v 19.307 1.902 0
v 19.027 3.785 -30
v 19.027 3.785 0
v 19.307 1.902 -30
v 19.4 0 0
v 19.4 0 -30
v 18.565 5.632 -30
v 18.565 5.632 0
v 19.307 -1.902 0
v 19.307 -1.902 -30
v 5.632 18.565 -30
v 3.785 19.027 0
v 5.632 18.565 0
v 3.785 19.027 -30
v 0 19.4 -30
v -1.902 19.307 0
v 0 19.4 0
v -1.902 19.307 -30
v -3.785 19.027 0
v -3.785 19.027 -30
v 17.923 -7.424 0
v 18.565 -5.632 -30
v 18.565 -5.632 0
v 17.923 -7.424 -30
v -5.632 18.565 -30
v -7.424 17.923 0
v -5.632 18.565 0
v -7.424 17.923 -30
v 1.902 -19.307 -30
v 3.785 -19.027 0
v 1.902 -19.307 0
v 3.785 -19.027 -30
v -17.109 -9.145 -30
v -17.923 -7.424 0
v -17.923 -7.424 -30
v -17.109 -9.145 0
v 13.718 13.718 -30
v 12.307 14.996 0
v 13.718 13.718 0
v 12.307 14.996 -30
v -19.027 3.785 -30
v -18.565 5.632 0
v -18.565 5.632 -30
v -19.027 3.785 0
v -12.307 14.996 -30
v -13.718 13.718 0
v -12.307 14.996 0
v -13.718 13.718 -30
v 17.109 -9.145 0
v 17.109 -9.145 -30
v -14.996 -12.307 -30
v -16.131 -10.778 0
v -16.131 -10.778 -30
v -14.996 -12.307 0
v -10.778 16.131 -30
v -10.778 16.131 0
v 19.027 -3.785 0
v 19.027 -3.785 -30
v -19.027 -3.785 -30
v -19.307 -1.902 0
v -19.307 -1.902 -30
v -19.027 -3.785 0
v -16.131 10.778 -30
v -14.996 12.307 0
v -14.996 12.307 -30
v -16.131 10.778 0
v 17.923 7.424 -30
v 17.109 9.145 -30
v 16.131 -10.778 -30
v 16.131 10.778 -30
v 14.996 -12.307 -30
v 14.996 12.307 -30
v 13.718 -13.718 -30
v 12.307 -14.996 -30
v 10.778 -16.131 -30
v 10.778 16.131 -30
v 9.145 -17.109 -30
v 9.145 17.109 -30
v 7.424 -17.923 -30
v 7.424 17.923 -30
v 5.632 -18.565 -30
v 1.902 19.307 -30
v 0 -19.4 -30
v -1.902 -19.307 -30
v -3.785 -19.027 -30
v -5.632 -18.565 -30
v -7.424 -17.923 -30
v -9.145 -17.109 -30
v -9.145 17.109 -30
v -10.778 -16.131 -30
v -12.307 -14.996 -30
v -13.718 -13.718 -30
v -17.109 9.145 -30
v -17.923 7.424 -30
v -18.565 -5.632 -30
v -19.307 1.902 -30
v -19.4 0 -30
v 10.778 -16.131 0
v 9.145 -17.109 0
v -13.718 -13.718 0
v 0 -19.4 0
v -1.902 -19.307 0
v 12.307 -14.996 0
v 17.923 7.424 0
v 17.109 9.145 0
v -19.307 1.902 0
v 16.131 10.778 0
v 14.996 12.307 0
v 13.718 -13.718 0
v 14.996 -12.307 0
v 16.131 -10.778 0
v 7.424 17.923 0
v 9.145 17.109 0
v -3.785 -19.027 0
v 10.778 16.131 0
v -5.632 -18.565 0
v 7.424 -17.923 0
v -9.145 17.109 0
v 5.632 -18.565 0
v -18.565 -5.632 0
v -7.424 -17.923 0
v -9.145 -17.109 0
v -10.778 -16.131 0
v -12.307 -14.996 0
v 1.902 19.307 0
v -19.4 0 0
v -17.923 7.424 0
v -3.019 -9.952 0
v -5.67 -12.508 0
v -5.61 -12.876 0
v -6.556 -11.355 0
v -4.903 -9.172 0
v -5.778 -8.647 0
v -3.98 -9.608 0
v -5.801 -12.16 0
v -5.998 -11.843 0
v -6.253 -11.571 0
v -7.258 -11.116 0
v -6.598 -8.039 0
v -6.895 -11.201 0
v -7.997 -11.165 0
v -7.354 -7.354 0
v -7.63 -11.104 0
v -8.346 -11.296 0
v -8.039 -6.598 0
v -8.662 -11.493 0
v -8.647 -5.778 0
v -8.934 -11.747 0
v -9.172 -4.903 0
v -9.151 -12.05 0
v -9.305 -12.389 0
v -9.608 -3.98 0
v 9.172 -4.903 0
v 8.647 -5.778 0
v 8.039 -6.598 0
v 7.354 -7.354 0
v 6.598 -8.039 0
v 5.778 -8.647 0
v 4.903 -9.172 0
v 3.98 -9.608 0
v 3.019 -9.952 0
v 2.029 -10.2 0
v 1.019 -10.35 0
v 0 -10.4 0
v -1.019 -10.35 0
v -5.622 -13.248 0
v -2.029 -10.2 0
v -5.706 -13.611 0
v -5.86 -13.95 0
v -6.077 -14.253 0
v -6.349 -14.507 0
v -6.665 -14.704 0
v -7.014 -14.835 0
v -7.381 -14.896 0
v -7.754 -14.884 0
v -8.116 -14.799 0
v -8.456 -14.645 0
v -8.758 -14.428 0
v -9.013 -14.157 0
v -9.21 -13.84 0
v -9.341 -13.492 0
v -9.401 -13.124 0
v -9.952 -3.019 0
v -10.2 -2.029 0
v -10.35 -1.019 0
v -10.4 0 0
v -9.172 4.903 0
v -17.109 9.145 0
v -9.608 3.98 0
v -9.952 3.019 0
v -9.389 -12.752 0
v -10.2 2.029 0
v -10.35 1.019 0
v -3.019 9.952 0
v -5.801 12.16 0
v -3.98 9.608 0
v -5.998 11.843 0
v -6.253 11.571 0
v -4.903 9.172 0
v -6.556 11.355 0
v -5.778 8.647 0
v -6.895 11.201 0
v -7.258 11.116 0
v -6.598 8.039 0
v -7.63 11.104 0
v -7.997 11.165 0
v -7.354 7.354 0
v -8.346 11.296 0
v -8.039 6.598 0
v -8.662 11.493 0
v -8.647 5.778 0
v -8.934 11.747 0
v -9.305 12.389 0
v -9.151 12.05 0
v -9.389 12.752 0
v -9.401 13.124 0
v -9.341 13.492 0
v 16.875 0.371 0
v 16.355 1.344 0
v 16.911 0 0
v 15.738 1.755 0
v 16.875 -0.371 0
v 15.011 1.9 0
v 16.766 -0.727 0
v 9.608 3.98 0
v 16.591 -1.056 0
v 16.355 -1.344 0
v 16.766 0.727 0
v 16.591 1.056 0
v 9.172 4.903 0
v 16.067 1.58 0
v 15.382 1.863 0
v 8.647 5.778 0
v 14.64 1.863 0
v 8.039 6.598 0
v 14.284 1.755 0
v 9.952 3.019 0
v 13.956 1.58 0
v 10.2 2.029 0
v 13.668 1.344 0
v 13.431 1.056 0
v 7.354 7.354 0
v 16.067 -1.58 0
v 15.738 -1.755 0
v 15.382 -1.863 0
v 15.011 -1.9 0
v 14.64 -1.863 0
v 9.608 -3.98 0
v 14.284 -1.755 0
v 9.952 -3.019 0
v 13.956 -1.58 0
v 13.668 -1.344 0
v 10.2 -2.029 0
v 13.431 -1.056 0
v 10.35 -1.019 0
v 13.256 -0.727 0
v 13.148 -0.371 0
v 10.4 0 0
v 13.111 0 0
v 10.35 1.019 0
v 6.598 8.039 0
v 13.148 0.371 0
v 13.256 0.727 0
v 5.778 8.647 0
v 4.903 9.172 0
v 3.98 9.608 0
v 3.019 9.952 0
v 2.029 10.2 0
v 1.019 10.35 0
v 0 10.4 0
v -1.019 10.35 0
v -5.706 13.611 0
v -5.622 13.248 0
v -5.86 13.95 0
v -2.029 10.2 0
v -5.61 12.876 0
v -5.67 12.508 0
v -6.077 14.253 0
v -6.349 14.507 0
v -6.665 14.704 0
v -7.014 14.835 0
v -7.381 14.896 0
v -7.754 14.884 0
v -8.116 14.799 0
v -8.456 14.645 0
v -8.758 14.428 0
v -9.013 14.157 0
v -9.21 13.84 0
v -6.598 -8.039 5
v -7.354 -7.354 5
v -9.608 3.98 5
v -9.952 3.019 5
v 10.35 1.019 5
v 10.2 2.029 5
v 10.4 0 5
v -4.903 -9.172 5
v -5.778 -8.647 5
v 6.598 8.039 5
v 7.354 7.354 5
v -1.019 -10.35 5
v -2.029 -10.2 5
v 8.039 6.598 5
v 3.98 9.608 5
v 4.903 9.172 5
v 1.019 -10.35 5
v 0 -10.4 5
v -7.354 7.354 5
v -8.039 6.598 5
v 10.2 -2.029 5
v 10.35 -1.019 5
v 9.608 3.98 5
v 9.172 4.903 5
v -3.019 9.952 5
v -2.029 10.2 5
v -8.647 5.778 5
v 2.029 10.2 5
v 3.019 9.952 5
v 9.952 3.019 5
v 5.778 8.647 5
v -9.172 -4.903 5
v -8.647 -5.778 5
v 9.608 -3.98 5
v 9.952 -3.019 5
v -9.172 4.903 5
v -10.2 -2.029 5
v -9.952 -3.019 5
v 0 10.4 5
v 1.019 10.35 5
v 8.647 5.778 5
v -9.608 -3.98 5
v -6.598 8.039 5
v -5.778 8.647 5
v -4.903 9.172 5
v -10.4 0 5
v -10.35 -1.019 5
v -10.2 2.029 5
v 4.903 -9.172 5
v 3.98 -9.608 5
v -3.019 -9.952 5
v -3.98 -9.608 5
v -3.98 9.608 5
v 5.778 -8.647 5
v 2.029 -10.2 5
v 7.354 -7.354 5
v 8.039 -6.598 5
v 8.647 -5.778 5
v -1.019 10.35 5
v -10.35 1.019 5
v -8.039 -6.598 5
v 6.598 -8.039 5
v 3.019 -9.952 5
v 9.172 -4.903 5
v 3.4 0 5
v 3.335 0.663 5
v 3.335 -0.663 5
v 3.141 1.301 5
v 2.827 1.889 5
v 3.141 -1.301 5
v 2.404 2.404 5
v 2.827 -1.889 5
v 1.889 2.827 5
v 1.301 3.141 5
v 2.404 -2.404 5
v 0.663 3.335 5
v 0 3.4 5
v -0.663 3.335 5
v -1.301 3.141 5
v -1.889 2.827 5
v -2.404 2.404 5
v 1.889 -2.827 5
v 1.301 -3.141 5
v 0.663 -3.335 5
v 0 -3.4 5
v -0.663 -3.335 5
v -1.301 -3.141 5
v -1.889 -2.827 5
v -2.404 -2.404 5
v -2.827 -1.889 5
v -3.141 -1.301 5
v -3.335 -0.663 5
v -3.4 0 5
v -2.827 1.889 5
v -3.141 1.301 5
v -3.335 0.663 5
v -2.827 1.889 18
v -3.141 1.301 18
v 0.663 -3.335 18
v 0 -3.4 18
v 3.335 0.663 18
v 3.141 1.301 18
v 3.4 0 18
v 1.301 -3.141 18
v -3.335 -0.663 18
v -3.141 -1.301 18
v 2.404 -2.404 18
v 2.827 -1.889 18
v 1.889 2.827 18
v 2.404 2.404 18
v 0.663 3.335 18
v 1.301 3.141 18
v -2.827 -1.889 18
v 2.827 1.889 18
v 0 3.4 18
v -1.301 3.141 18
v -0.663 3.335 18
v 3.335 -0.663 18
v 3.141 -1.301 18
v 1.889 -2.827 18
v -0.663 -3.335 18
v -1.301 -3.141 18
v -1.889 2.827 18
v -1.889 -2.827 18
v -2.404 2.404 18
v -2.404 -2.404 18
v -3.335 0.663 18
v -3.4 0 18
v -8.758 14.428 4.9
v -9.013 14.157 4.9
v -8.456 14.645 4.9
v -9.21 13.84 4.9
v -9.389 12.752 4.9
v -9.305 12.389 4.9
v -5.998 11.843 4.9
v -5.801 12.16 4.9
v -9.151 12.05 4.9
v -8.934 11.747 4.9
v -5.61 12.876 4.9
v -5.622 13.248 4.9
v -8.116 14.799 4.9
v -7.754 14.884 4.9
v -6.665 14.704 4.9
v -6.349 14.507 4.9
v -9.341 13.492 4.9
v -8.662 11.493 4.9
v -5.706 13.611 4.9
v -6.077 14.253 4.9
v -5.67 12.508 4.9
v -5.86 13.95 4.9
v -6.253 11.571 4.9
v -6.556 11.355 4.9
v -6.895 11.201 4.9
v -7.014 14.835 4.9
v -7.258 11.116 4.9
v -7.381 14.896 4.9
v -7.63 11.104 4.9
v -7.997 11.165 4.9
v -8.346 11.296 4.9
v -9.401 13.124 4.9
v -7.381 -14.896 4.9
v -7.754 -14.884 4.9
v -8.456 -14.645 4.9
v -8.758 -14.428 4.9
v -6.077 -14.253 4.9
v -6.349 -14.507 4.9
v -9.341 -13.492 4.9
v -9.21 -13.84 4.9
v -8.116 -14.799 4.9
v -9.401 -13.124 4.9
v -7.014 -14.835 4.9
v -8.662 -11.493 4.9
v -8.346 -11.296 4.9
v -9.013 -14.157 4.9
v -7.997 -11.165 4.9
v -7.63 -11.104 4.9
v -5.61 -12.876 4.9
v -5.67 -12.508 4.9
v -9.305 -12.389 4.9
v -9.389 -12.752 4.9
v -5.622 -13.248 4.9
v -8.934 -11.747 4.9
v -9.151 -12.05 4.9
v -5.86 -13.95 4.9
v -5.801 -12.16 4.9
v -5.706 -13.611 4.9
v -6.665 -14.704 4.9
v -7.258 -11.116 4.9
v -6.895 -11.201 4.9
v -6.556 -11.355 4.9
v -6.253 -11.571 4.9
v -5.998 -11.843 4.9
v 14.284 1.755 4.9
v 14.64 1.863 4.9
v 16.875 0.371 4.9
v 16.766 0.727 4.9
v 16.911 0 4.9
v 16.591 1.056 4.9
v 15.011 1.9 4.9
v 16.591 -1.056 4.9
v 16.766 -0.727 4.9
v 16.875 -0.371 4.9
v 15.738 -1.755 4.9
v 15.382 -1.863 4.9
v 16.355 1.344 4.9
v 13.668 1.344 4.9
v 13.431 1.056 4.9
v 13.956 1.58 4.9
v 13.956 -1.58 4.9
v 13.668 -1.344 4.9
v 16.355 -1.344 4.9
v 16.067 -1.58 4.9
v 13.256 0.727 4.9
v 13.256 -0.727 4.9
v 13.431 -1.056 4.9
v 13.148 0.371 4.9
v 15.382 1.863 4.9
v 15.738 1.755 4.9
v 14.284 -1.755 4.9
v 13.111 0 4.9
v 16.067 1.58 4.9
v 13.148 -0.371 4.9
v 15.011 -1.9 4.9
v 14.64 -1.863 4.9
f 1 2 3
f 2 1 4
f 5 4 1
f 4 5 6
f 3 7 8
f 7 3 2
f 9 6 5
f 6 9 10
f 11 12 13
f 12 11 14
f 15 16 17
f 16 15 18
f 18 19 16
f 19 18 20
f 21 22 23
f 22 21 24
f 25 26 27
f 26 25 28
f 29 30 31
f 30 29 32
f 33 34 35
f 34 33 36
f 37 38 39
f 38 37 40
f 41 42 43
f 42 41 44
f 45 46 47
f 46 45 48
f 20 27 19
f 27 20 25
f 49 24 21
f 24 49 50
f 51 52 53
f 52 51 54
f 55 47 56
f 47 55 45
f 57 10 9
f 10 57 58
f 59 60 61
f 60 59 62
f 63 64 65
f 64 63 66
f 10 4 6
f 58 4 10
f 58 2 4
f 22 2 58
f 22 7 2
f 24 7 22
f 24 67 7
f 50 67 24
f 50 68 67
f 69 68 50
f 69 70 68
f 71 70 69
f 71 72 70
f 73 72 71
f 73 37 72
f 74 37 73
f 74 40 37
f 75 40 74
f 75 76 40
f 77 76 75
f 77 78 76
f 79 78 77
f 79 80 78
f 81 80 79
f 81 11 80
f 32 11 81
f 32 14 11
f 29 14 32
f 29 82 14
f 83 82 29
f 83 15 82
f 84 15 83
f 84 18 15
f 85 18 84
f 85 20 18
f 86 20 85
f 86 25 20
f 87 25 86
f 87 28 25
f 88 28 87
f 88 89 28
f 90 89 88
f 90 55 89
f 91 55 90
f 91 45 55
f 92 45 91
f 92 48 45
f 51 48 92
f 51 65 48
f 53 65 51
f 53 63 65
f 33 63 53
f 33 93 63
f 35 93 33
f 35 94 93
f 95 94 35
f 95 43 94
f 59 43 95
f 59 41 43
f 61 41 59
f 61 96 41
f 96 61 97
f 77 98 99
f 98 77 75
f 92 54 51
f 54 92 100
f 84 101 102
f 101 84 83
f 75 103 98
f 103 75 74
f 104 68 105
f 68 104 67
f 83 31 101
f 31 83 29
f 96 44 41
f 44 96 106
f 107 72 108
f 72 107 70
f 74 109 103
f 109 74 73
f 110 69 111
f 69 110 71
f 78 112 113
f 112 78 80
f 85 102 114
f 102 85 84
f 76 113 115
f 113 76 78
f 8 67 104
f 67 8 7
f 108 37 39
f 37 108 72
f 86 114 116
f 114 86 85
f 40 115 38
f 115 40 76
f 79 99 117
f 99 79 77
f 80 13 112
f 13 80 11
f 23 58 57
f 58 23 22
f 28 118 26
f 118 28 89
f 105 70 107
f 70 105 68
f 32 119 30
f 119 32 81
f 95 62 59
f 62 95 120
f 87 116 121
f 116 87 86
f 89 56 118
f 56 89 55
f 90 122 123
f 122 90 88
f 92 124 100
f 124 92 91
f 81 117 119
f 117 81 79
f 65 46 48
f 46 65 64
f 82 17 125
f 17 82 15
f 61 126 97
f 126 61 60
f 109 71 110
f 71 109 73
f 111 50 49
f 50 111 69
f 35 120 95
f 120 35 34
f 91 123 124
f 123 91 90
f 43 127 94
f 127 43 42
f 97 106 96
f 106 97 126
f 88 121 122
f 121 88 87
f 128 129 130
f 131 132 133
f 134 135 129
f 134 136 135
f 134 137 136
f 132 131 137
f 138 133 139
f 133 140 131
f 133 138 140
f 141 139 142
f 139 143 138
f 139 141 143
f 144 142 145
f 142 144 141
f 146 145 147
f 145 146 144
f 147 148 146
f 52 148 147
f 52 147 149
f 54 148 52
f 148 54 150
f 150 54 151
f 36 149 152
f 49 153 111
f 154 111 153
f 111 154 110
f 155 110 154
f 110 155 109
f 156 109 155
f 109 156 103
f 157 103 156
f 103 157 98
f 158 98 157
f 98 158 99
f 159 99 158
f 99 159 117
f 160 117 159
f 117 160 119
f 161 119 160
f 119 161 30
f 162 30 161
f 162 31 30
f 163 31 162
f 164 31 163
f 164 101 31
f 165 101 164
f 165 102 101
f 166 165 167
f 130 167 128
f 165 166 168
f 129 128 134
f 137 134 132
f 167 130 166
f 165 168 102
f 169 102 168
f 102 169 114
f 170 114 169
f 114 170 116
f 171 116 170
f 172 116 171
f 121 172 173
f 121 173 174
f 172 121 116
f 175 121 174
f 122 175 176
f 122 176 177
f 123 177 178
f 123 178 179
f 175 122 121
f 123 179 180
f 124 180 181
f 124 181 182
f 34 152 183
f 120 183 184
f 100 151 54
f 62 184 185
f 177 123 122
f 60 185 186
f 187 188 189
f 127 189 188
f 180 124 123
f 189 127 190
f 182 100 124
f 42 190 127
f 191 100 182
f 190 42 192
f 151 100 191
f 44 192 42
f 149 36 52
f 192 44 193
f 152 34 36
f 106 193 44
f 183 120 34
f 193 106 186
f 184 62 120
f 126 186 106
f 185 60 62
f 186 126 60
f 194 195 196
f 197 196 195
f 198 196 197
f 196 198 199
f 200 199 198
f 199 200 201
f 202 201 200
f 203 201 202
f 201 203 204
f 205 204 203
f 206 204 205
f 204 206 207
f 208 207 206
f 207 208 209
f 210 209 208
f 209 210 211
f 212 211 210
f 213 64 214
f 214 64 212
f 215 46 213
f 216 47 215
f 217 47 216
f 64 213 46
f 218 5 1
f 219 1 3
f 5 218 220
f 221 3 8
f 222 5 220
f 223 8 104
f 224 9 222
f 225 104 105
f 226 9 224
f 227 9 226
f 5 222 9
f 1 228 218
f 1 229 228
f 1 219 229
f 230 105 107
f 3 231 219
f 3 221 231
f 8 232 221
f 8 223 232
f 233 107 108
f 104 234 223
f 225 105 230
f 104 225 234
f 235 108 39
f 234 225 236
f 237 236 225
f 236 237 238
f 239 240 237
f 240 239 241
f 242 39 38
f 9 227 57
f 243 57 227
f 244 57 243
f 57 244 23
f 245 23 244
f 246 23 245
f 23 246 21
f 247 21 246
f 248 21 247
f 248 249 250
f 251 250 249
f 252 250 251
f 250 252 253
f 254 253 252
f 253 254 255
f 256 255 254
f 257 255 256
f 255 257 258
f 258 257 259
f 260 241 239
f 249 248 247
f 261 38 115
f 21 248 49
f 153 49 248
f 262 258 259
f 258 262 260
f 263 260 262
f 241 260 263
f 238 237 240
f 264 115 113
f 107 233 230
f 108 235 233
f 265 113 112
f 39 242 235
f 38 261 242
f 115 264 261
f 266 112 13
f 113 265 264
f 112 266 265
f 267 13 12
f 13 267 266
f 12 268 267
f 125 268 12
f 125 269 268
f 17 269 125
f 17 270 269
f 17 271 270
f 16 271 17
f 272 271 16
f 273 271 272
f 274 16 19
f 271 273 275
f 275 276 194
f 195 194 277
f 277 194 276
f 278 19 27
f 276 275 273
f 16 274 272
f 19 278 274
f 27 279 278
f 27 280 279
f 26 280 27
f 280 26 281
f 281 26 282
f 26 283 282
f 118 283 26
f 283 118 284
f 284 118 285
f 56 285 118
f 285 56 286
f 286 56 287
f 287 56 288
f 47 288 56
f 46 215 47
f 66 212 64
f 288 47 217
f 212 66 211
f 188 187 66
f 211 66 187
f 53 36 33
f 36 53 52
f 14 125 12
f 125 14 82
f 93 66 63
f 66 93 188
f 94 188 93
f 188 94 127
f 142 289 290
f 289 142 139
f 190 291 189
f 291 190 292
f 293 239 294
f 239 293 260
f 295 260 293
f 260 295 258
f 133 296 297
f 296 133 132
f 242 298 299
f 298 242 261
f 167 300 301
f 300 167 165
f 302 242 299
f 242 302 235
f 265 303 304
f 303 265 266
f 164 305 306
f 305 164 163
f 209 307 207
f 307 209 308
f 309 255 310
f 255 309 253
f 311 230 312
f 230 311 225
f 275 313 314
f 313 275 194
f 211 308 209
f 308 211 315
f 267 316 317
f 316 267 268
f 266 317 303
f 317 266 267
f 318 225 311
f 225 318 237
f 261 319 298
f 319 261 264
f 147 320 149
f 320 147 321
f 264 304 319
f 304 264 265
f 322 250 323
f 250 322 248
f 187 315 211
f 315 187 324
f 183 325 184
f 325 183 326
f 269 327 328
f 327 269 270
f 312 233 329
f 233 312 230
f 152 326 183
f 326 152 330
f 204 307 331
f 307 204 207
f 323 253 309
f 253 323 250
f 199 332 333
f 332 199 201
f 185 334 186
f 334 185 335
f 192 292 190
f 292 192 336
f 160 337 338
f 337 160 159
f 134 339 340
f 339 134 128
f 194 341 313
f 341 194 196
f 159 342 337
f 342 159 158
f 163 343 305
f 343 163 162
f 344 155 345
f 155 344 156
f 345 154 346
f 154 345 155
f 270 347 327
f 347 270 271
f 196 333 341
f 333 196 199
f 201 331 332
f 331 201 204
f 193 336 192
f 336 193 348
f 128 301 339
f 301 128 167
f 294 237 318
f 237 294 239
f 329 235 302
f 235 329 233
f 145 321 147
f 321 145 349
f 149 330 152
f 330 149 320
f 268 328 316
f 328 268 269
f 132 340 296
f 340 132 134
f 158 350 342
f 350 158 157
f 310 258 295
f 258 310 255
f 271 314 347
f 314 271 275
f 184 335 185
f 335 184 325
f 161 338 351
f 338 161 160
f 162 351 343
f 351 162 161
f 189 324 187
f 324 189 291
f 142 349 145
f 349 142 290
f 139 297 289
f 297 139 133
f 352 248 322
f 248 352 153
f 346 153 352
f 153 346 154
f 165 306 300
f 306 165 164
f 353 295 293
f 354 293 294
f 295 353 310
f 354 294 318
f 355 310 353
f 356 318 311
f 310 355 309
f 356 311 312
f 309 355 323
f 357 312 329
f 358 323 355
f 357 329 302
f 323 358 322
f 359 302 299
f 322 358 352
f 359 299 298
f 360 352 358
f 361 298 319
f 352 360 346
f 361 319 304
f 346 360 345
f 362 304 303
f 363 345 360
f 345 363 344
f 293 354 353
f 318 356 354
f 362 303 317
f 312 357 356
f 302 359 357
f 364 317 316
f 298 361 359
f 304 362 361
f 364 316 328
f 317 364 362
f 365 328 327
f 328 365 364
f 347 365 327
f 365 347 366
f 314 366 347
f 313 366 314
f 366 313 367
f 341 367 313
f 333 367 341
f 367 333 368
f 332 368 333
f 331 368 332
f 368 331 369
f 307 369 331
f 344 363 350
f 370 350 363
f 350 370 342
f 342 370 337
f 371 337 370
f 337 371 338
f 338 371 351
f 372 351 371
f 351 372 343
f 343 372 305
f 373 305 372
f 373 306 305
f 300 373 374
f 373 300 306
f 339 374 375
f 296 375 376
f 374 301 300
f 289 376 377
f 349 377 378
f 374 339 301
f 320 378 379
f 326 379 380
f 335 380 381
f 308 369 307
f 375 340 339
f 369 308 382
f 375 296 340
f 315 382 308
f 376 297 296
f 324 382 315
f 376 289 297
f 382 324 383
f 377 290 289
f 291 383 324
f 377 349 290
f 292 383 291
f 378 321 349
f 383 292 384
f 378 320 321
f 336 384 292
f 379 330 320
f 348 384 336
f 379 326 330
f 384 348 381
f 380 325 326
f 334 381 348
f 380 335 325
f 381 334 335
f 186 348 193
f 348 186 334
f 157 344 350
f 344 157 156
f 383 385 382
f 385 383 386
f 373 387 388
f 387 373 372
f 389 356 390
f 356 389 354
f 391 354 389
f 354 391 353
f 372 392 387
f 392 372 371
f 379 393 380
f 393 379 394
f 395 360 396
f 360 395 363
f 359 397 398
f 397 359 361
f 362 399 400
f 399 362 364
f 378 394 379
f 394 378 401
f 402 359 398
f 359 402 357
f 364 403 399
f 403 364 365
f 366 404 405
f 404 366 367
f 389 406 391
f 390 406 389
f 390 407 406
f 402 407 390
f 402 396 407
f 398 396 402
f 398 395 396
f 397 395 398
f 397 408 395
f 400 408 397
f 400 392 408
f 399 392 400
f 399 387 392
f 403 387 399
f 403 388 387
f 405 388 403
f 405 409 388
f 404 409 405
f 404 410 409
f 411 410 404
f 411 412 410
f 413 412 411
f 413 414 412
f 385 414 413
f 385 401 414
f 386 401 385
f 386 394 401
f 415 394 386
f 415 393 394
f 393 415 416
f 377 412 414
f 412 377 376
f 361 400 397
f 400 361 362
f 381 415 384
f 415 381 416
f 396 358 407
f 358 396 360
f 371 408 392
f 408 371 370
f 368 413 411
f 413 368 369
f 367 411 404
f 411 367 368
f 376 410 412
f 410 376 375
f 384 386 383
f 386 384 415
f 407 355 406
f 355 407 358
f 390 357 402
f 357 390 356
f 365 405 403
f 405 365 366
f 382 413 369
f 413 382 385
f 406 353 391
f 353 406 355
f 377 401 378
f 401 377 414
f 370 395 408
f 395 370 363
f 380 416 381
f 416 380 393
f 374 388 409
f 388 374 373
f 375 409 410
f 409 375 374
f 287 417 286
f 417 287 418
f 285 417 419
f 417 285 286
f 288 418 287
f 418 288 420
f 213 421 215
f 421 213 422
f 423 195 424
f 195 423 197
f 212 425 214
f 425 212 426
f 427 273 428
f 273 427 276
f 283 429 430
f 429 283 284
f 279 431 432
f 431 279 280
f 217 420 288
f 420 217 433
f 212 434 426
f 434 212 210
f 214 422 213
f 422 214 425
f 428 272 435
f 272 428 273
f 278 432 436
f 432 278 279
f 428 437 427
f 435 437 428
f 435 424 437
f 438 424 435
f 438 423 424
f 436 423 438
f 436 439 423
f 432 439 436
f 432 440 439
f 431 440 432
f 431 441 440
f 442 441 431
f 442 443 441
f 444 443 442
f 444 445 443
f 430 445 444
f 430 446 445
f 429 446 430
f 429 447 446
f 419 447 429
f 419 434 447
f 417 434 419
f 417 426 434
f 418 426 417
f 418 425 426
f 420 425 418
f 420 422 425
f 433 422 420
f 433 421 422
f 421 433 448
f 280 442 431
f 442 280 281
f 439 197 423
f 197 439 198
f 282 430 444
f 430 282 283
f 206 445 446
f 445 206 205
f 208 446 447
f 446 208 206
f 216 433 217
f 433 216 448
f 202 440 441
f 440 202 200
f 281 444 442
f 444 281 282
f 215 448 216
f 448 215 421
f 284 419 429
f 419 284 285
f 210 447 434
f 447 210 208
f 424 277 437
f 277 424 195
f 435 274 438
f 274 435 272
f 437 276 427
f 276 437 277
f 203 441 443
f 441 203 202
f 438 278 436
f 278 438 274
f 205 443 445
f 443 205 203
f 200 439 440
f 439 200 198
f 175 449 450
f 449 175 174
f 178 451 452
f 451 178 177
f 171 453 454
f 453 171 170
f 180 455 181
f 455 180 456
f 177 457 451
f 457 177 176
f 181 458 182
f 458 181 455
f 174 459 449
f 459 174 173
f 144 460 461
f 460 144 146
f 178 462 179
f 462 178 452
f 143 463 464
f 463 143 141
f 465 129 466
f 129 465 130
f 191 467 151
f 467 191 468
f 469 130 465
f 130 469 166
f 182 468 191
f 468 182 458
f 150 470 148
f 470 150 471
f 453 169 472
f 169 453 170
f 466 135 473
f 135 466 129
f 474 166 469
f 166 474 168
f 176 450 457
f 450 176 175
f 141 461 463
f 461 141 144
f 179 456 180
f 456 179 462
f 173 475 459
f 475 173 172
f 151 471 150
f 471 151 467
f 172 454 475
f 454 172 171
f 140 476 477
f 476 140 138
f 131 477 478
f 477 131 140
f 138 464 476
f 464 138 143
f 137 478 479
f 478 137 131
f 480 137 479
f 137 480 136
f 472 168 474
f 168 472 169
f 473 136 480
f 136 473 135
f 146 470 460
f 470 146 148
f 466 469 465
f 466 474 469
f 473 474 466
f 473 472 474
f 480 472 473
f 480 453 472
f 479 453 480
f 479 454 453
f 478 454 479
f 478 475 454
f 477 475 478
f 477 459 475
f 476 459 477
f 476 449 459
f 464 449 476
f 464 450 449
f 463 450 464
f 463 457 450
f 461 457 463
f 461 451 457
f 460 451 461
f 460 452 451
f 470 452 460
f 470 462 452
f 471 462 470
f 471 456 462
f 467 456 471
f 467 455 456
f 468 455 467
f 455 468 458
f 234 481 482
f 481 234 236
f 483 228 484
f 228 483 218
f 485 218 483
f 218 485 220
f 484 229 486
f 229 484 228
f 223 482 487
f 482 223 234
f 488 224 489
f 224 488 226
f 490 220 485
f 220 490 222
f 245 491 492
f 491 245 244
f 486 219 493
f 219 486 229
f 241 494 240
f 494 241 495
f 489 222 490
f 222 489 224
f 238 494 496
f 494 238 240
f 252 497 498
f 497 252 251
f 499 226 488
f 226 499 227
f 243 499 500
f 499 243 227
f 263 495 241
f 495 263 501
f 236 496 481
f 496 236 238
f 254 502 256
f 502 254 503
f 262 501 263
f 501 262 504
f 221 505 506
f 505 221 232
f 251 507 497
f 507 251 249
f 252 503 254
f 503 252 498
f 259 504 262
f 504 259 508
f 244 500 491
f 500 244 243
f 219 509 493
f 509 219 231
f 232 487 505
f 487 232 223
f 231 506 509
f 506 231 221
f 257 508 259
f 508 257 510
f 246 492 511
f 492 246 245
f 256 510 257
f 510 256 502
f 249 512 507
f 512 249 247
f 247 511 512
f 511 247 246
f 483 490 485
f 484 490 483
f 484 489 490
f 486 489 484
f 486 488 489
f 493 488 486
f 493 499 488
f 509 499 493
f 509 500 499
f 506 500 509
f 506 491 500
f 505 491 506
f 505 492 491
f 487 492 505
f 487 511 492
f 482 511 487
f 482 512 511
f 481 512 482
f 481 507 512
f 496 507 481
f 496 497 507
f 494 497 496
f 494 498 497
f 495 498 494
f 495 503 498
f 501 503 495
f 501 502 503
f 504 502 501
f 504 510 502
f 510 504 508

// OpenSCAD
_ScrewLength = 5;
_ScrewDiameter = 3.8;
_AluWidth = 25;
_WheelDiameter = 96;
_BoltDiameter = 6.8;
_Tolerance = 0.2;

//EncoderMount2();
//Concept();
//BallBearingMount();
Encoder();
module Encoder()
{
	translate([0,0,-30])
	union()
	{
		cylinder(d=38.8, h=30, $fn=64);
		translate([0,0,29.9])
		cylinder(d=20.8, h=5.1, $fn=64);
		translate([0,0,34.9])
		cylinder(d=6.8, h=13.1, $fn=32);

		rotate([0,0,120])
		translate([15.0111,0,29.9])
		cylinder(d=_ScrewDiameter, h=_ScrewLength, $fn=32);
		rotate([0,0,240])
		translate([15.0111,0,29.9])
		cylinder(d=_ScrewDiameter, h=_ScrewLength, $fn=32);
		translate([15.0111,0,29.9])
		cylinder(d=_ScrewDiameter, h=_ScrewLength, $fn=32);
	}
}

module Wheel()
{
	cylinder(d=_WheelDiameter, h=15, $fn=64);
}

module Concept()
{
	rotate([90,0,-90])
	union()
	{
		EncoderMount();
		translate([0,0,3])
		rotate([180,0,0])
		Encoder();
		translate([0,0,-18])
		Wheel();
	}
}

module BallBearingMount()
{
	translate([0,0,4.5])
	difference()
	{
		union()
		{
			cube([3*_AluWidth, _AluWidth, 9], center=true);
			cylinder(d=30, h=9, $fn=64, center=true);
		}
		union()
		{
			translate([0,0,1+0.5*_Tolerance])
			cylinder(d=22.4, h=7+_Tolerance, $fn=64, center=true);
			cylinder(d=13, h=0.5*_AluWidth-_Tolerance+0.2, $fn=64, center=true);
			translate([_AluWidth,0,0])
			cylinder(d=_BoltDiameter, h=0.5*_AluWidth-_Tolerance+0.2, $fn=64, center=true);
			translate([-_AluWidth,0,0])
			cylinder(d=_BoltDiameter, h=0.5*_AluWidth-_Tolerance+0.2, $fn=64, center=true);
		}		
	}
}

module Concept2()
{
	rotate([90,0,-90])
	union()
	{
		EncoderMount2();
		translate([0,0,3])
		rotate([180,0,0])
		Encoder();
		translate([0,0,-18])
		Wheel();
	}
}


module EncoderMount()
{
	difference()
	{
		hull()
		{
			cylinder(d=45, h=14, $fn=64);
			//translate([0,-22.5,0])
			//cube([70,45,14]);
			translate([55,0,0])
			cylinder(d=30, h=14, $fn=64);
		}
		union()
		{
			translate([55,0,-0.1])
			cylinder(d=22.4, h=14.2, $fn=64);
			translate([0,0,3])
			rotate([180,0,0])
			Encoder();
		}
	}
}

module EncoderMount2()
{
	difference()
	{
		hull()
		{
			cylinder(d=45, h=10, $fn=64);
			//translate([0,-22.5,0])
			//cube([70,45,14]);
			translate([4*_AluWidth-(_WheelDiameter*0.5),-_AluWidth,0])
			cube([_AluWidth,2*_AluWidth,10]);
		}
		union()
		{
			translate([4.5*_AluWidth-(_WheelDiameter*0.5),0.5*_AluWidth,-0.1])
			cylinder(d=_BoltDiameter, h=10.2, $fn=64);
			translate([4.5*_AluWidth-(_WheelDiameter*0.5),-0.5*_AluWidth,-0.1])
			cylinder(d=_BoltDiameter, h=10.2, $fn=64);
			translate([0,0,3])
			rotate([180,0,0])
			Encoder();
		}
	}
}
